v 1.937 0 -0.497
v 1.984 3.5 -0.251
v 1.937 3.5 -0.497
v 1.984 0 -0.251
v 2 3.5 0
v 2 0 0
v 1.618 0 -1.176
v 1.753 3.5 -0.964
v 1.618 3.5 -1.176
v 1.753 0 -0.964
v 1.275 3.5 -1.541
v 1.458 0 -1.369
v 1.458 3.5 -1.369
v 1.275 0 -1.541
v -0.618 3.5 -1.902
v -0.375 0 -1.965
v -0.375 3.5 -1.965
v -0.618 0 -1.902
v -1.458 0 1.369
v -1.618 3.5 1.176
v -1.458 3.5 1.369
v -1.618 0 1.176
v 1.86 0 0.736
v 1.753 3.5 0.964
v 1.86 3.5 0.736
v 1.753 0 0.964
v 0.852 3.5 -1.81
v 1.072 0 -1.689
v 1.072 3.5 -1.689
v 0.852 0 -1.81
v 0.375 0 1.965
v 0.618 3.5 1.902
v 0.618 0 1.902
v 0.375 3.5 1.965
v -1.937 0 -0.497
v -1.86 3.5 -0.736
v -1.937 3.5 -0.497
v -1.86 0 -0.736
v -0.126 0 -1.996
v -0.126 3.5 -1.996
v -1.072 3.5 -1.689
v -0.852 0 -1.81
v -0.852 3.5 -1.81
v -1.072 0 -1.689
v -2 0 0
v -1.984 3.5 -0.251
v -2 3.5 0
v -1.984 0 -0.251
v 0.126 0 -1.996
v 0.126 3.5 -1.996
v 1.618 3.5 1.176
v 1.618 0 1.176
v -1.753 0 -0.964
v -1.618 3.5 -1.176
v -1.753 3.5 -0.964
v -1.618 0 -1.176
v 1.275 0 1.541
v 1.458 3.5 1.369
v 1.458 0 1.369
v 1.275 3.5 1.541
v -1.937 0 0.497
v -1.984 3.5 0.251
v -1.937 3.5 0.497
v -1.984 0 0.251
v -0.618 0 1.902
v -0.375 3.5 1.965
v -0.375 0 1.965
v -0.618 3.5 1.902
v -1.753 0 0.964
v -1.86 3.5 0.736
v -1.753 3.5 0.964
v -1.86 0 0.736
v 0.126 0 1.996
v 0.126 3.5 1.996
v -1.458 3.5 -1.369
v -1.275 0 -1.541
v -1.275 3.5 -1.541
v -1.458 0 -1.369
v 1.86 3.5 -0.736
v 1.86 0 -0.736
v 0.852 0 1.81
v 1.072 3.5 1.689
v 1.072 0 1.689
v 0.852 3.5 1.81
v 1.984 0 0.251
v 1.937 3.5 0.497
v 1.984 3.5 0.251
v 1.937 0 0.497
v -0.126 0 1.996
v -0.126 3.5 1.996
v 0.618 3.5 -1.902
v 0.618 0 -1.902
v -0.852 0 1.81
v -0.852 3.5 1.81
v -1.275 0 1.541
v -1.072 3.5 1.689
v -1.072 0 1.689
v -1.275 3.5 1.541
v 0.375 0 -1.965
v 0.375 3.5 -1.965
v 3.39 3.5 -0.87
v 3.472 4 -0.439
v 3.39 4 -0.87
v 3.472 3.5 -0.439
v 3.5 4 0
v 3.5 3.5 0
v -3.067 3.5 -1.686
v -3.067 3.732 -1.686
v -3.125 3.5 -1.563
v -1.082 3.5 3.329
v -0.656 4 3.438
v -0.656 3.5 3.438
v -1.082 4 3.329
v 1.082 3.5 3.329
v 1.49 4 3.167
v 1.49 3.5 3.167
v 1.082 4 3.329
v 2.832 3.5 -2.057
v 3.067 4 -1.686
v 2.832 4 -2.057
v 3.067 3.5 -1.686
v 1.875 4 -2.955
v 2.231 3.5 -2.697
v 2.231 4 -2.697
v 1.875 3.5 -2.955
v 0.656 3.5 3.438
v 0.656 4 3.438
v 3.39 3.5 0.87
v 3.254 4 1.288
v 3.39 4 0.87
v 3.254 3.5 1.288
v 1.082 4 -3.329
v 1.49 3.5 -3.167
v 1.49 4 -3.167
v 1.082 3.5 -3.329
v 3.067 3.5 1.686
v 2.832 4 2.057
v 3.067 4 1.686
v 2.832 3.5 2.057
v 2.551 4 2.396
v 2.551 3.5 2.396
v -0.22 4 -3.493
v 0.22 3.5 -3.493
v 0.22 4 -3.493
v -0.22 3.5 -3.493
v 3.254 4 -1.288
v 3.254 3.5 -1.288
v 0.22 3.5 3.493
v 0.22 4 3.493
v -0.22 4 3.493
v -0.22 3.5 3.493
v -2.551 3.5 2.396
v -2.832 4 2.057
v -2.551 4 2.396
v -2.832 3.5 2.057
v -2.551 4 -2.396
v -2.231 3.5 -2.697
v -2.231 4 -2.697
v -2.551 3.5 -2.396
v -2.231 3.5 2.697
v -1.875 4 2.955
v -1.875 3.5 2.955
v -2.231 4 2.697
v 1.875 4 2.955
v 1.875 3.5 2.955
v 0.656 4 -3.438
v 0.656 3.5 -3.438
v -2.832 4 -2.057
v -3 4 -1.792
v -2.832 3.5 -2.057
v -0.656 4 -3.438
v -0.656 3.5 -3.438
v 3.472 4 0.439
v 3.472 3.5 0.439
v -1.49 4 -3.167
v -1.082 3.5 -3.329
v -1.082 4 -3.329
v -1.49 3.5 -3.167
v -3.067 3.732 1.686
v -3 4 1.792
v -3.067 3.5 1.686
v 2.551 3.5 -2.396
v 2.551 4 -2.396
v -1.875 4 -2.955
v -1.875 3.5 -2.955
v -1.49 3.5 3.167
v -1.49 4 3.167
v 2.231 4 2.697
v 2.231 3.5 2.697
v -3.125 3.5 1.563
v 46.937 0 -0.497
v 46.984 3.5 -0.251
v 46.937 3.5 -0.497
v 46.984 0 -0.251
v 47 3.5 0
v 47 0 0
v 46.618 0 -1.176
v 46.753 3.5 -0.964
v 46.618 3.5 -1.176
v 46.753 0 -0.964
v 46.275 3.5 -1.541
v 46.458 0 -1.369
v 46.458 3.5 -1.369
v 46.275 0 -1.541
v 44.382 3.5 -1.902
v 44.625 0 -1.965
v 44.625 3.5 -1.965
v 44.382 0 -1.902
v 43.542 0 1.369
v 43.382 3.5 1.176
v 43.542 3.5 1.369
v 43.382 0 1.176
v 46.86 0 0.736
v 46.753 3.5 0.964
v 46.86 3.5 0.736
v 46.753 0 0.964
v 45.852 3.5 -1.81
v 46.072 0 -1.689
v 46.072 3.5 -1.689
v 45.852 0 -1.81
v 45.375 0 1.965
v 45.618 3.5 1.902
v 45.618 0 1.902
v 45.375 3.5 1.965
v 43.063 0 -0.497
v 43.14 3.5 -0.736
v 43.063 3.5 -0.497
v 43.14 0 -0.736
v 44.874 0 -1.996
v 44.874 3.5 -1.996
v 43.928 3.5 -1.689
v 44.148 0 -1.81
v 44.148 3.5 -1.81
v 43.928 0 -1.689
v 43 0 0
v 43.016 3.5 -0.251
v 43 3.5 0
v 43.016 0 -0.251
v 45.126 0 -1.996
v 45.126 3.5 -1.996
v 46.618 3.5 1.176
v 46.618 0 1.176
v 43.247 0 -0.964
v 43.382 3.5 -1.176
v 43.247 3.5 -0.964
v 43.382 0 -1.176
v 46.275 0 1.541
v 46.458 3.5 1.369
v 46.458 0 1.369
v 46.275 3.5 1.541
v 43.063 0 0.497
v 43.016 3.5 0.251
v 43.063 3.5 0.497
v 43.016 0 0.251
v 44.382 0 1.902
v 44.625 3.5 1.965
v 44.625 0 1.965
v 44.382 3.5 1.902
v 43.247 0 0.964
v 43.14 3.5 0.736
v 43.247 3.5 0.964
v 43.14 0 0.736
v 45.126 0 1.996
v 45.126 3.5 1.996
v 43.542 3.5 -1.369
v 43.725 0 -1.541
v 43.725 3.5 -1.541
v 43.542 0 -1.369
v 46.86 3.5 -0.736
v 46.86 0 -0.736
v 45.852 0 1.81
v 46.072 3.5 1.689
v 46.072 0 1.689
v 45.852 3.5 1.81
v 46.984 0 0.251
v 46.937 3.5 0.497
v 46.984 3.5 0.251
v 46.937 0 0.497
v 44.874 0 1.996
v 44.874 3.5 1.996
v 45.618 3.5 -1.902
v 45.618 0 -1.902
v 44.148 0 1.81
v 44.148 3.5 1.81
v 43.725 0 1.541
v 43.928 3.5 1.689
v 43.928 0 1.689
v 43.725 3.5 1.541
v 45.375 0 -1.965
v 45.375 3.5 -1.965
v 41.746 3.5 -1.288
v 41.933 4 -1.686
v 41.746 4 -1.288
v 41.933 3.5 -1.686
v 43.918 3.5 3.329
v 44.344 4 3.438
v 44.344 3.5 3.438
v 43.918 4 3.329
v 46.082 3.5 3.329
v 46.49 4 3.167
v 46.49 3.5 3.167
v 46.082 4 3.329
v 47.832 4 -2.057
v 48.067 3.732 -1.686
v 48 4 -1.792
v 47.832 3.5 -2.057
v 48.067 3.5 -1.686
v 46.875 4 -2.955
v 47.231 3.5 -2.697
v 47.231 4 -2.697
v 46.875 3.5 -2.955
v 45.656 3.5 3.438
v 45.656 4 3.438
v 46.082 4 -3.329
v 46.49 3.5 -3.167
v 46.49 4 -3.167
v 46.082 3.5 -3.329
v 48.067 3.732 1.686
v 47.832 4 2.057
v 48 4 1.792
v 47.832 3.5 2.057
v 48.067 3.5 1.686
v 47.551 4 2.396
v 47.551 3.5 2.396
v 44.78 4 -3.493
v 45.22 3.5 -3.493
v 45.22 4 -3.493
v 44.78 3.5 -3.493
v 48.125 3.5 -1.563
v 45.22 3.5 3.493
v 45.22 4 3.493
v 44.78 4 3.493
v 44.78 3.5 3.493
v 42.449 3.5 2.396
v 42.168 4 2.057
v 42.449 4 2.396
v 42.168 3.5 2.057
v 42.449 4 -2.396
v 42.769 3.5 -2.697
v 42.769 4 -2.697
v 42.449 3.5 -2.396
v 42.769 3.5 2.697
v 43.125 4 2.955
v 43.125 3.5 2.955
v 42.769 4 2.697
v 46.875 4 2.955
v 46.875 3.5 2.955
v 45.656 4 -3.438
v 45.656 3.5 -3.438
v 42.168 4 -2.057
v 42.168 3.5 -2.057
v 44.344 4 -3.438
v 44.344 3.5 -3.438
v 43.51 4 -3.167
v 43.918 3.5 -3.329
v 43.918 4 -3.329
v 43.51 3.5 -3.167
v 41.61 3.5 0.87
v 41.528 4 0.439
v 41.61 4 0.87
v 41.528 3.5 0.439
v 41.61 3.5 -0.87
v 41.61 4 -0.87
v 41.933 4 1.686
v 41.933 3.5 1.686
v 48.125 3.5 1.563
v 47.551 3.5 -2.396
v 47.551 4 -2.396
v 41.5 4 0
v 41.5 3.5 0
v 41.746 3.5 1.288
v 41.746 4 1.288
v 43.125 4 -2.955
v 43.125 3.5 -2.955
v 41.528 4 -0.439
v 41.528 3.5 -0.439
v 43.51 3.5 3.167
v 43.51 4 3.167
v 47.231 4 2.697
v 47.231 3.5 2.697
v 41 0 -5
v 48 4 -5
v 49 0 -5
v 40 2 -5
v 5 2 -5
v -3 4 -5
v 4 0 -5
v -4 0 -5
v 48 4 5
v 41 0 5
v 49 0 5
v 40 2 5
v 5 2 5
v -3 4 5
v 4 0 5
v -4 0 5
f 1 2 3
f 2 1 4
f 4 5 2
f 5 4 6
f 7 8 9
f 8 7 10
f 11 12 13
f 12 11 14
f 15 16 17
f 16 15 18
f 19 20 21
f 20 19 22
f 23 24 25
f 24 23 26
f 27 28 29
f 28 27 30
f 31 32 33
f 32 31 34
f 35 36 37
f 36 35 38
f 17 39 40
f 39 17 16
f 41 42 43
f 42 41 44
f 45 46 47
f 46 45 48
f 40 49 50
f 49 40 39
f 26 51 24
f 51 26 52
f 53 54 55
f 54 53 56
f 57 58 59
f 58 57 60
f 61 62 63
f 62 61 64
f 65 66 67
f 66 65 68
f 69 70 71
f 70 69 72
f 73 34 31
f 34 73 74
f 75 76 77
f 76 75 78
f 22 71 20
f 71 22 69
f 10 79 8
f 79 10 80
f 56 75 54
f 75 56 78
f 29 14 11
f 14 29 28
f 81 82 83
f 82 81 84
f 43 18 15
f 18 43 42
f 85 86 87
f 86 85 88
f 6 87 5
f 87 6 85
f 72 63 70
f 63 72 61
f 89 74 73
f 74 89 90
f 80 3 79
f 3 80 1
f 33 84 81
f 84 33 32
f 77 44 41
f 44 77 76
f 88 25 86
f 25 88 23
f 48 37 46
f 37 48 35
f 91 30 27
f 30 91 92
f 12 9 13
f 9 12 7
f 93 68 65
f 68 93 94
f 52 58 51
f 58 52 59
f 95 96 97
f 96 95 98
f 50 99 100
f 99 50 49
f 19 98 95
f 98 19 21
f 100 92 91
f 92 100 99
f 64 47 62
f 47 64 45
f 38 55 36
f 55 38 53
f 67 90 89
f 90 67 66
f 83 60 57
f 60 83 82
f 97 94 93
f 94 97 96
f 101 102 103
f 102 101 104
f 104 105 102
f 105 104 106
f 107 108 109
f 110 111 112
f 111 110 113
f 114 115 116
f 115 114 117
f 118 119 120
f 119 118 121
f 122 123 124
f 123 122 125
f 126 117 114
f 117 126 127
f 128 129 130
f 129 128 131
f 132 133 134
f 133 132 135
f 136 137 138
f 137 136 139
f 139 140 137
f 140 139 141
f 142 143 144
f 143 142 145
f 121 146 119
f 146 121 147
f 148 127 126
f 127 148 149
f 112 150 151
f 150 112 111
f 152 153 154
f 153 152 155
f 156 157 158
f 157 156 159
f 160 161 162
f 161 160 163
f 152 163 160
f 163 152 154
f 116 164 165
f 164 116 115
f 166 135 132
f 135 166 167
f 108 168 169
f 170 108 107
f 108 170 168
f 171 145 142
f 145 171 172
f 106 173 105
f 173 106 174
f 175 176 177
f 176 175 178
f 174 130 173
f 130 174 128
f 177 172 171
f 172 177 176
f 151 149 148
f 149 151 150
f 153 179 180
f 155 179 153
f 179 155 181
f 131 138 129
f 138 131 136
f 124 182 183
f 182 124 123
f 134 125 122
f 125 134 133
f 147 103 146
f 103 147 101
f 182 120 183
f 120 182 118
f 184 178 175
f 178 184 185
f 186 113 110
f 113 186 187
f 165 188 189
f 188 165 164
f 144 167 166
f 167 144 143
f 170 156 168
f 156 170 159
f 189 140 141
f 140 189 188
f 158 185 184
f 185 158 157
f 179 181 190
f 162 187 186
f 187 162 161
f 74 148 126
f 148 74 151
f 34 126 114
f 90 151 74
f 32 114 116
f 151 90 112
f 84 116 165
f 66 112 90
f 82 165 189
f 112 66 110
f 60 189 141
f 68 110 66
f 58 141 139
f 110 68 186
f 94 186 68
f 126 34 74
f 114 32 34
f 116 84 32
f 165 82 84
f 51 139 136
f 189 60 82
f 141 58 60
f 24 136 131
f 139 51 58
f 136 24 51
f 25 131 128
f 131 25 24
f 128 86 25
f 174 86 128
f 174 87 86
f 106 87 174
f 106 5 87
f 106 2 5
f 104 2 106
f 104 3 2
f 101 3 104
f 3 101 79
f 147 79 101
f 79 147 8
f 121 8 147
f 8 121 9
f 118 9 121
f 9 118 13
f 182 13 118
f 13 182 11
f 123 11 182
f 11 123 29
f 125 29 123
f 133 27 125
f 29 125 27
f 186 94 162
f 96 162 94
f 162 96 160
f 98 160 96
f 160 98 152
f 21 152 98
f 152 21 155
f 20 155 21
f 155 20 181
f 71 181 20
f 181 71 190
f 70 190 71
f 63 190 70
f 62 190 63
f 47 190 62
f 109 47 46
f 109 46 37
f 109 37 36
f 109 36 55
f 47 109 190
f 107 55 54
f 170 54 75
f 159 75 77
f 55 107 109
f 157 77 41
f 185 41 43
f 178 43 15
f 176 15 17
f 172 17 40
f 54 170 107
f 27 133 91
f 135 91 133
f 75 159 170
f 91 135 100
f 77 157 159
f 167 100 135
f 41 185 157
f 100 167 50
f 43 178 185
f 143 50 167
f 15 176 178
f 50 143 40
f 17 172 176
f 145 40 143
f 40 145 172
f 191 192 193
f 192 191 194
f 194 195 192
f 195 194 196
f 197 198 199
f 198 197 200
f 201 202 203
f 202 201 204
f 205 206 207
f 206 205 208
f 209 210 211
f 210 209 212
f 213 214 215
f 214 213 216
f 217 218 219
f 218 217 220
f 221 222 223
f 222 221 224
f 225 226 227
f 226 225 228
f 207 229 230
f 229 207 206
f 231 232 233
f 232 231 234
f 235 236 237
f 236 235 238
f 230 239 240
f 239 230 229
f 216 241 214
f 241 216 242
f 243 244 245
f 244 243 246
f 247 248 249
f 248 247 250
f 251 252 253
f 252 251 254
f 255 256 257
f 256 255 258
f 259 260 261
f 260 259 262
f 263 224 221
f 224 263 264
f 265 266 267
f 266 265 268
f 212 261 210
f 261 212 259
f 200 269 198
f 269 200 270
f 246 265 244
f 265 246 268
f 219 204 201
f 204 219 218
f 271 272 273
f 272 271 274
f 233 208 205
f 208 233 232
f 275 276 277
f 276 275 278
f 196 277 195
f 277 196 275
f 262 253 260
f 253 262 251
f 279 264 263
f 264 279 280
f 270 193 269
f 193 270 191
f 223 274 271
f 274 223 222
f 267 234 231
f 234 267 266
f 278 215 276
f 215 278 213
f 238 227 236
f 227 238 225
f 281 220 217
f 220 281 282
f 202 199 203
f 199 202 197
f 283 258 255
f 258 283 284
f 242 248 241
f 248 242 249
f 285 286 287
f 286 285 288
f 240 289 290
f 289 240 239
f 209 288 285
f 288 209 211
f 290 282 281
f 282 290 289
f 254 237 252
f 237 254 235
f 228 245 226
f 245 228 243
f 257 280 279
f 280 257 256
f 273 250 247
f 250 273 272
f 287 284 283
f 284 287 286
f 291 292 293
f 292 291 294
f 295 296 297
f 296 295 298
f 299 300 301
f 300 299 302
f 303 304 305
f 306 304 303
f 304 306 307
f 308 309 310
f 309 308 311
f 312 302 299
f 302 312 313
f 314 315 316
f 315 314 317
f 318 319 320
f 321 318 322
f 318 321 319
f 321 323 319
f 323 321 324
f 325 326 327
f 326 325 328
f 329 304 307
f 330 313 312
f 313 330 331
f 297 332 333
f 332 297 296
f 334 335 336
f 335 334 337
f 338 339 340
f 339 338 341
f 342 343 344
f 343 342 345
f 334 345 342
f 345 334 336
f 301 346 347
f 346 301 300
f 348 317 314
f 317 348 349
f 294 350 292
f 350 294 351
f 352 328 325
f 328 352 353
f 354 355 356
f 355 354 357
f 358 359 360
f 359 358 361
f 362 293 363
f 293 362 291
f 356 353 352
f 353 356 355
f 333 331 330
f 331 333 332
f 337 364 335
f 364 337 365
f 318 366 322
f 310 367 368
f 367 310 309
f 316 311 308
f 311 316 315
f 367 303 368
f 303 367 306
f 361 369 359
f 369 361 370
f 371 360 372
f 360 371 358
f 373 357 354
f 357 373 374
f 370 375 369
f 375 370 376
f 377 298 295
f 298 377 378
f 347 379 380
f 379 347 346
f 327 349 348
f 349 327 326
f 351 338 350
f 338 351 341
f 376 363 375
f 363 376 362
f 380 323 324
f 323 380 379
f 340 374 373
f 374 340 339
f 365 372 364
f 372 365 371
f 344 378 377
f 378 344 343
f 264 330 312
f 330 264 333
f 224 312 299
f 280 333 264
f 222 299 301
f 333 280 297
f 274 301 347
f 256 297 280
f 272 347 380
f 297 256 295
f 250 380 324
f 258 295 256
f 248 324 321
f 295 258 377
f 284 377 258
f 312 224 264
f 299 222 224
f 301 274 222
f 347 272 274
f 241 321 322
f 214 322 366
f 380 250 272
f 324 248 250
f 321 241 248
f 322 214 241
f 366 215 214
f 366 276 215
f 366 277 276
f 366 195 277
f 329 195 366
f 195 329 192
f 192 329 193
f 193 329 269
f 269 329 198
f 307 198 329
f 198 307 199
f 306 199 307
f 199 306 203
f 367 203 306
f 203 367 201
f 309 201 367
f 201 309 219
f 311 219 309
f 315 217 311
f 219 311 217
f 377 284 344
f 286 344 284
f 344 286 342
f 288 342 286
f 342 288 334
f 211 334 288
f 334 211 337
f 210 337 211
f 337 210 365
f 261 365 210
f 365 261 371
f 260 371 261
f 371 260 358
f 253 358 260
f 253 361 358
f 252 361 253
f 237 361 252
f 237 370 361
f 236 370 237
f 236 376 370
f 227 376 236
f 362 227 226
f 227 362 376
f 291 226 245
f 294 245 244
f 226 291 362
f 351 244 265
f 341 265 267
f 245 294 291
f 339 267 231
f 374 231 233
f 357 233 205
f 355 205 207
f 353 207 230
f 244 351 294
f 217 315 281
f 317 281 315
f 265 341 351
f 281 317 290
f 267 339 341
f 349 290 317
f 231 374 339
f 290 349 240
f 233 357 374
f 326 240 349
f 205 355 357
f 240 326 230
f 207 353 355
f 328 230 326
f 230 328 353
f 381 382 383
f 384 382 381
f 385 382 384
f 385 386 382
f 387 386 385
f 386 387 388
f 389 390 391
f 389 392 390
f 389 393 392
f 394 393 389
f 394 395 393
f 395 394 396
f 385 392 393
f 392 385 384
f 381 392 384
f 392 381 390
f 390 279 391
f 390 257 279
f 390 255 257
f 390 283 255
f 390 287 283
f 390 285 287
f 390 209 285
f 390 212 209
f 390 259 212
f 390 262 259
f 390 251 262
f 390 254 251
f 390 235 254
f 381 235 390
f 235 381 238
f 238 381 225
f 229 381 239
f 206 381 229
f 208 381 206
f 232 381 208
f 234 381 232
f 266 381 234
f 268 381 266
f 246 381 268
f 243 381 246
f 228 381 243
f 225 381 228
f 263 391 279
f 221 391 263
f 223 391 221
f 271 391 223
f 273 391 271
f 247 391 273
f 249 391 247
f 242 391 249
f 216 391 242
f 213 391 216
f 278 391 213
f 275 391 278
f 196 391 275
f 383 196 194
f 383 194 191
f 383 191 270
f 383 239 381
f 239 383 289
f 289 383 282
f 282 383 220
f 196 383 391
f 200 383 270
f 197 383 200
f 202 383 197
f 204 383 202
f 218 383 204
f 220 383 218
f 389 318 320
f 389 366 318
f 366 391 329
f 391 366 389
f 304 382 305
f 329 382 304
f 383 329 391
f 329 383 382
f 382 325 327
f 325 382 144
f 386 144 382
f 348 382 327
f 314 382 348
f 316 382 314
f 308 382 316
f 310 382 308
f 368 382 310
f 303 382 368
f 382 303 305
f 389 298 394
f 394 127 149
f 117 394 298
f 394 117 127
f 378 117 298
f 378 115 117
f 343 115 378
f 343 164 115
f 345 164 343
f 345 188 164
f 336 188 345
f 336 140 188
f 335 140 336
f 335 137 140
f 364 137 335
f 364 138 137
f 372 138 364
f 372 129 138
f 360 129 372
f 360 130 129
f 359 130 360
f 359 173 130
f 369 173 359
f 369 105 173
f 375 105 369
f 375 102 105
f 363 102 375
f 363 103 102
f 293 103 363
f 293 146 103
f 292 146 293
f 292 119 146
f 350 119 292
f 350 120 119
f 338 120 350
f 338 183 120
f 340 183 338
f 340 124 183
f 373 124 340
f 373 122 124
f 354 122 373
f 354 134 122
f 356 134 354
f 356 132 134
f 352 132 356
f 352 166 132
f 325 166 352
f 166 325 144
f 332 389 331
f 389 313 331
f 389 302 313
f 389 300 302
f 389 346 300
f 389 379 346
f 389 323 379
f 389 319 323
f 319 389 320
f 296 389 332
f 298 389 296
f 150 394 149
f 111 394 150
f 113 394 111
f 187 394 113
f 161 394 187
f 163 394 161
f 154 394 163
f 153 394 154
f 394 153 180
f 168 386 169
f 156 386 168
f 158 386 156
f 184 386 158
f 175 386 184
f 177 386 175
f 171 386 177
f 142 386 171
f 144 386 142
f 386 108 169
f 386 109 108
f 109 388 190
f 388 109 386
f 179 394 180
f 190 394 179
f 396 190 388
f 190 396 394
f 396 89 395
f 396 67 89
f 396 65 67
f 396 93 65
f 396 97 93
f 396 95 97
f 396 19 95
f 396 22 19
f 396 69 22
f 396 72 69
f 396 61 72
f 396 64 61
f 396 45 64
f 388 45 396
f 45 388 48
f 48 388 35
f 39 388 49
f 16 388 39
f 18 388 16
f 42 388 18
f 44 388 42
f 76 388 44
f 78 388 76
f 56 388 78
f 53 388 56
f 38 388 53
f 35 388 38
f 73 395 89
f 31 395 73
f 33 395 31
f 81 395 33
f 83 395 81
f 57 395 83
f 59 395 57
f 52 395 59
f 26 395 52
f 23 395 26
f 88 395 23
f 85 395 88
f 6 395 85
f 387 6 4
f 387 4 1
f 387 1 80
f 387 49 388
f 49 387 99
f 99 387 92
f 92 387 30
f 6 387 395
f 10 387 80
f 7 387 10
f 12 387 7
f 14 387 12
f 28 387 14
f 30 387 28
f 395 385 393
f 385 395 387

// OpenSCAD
$fa = 1;
$fs = 0.5;
$fn = 50;

module hole() {
  rotate([-90,0,0]) cylinder(h=16,r=2);
  translate([0,3+3.5,0]) rotate([-90,0,0]) cylinder(h=10,r=3.5);
}

difference() {
  translate([0,0,-5]) linear_extrude(10) {
    polygon(points=[[-4,0],[4,0],[5,2],
      [40,2],[41,0],[49,0],
      [48,4],[-3,4]]);
  }
  translate([0,-3,0]) hole();
  translate([45,-3,0]) hole();
}
